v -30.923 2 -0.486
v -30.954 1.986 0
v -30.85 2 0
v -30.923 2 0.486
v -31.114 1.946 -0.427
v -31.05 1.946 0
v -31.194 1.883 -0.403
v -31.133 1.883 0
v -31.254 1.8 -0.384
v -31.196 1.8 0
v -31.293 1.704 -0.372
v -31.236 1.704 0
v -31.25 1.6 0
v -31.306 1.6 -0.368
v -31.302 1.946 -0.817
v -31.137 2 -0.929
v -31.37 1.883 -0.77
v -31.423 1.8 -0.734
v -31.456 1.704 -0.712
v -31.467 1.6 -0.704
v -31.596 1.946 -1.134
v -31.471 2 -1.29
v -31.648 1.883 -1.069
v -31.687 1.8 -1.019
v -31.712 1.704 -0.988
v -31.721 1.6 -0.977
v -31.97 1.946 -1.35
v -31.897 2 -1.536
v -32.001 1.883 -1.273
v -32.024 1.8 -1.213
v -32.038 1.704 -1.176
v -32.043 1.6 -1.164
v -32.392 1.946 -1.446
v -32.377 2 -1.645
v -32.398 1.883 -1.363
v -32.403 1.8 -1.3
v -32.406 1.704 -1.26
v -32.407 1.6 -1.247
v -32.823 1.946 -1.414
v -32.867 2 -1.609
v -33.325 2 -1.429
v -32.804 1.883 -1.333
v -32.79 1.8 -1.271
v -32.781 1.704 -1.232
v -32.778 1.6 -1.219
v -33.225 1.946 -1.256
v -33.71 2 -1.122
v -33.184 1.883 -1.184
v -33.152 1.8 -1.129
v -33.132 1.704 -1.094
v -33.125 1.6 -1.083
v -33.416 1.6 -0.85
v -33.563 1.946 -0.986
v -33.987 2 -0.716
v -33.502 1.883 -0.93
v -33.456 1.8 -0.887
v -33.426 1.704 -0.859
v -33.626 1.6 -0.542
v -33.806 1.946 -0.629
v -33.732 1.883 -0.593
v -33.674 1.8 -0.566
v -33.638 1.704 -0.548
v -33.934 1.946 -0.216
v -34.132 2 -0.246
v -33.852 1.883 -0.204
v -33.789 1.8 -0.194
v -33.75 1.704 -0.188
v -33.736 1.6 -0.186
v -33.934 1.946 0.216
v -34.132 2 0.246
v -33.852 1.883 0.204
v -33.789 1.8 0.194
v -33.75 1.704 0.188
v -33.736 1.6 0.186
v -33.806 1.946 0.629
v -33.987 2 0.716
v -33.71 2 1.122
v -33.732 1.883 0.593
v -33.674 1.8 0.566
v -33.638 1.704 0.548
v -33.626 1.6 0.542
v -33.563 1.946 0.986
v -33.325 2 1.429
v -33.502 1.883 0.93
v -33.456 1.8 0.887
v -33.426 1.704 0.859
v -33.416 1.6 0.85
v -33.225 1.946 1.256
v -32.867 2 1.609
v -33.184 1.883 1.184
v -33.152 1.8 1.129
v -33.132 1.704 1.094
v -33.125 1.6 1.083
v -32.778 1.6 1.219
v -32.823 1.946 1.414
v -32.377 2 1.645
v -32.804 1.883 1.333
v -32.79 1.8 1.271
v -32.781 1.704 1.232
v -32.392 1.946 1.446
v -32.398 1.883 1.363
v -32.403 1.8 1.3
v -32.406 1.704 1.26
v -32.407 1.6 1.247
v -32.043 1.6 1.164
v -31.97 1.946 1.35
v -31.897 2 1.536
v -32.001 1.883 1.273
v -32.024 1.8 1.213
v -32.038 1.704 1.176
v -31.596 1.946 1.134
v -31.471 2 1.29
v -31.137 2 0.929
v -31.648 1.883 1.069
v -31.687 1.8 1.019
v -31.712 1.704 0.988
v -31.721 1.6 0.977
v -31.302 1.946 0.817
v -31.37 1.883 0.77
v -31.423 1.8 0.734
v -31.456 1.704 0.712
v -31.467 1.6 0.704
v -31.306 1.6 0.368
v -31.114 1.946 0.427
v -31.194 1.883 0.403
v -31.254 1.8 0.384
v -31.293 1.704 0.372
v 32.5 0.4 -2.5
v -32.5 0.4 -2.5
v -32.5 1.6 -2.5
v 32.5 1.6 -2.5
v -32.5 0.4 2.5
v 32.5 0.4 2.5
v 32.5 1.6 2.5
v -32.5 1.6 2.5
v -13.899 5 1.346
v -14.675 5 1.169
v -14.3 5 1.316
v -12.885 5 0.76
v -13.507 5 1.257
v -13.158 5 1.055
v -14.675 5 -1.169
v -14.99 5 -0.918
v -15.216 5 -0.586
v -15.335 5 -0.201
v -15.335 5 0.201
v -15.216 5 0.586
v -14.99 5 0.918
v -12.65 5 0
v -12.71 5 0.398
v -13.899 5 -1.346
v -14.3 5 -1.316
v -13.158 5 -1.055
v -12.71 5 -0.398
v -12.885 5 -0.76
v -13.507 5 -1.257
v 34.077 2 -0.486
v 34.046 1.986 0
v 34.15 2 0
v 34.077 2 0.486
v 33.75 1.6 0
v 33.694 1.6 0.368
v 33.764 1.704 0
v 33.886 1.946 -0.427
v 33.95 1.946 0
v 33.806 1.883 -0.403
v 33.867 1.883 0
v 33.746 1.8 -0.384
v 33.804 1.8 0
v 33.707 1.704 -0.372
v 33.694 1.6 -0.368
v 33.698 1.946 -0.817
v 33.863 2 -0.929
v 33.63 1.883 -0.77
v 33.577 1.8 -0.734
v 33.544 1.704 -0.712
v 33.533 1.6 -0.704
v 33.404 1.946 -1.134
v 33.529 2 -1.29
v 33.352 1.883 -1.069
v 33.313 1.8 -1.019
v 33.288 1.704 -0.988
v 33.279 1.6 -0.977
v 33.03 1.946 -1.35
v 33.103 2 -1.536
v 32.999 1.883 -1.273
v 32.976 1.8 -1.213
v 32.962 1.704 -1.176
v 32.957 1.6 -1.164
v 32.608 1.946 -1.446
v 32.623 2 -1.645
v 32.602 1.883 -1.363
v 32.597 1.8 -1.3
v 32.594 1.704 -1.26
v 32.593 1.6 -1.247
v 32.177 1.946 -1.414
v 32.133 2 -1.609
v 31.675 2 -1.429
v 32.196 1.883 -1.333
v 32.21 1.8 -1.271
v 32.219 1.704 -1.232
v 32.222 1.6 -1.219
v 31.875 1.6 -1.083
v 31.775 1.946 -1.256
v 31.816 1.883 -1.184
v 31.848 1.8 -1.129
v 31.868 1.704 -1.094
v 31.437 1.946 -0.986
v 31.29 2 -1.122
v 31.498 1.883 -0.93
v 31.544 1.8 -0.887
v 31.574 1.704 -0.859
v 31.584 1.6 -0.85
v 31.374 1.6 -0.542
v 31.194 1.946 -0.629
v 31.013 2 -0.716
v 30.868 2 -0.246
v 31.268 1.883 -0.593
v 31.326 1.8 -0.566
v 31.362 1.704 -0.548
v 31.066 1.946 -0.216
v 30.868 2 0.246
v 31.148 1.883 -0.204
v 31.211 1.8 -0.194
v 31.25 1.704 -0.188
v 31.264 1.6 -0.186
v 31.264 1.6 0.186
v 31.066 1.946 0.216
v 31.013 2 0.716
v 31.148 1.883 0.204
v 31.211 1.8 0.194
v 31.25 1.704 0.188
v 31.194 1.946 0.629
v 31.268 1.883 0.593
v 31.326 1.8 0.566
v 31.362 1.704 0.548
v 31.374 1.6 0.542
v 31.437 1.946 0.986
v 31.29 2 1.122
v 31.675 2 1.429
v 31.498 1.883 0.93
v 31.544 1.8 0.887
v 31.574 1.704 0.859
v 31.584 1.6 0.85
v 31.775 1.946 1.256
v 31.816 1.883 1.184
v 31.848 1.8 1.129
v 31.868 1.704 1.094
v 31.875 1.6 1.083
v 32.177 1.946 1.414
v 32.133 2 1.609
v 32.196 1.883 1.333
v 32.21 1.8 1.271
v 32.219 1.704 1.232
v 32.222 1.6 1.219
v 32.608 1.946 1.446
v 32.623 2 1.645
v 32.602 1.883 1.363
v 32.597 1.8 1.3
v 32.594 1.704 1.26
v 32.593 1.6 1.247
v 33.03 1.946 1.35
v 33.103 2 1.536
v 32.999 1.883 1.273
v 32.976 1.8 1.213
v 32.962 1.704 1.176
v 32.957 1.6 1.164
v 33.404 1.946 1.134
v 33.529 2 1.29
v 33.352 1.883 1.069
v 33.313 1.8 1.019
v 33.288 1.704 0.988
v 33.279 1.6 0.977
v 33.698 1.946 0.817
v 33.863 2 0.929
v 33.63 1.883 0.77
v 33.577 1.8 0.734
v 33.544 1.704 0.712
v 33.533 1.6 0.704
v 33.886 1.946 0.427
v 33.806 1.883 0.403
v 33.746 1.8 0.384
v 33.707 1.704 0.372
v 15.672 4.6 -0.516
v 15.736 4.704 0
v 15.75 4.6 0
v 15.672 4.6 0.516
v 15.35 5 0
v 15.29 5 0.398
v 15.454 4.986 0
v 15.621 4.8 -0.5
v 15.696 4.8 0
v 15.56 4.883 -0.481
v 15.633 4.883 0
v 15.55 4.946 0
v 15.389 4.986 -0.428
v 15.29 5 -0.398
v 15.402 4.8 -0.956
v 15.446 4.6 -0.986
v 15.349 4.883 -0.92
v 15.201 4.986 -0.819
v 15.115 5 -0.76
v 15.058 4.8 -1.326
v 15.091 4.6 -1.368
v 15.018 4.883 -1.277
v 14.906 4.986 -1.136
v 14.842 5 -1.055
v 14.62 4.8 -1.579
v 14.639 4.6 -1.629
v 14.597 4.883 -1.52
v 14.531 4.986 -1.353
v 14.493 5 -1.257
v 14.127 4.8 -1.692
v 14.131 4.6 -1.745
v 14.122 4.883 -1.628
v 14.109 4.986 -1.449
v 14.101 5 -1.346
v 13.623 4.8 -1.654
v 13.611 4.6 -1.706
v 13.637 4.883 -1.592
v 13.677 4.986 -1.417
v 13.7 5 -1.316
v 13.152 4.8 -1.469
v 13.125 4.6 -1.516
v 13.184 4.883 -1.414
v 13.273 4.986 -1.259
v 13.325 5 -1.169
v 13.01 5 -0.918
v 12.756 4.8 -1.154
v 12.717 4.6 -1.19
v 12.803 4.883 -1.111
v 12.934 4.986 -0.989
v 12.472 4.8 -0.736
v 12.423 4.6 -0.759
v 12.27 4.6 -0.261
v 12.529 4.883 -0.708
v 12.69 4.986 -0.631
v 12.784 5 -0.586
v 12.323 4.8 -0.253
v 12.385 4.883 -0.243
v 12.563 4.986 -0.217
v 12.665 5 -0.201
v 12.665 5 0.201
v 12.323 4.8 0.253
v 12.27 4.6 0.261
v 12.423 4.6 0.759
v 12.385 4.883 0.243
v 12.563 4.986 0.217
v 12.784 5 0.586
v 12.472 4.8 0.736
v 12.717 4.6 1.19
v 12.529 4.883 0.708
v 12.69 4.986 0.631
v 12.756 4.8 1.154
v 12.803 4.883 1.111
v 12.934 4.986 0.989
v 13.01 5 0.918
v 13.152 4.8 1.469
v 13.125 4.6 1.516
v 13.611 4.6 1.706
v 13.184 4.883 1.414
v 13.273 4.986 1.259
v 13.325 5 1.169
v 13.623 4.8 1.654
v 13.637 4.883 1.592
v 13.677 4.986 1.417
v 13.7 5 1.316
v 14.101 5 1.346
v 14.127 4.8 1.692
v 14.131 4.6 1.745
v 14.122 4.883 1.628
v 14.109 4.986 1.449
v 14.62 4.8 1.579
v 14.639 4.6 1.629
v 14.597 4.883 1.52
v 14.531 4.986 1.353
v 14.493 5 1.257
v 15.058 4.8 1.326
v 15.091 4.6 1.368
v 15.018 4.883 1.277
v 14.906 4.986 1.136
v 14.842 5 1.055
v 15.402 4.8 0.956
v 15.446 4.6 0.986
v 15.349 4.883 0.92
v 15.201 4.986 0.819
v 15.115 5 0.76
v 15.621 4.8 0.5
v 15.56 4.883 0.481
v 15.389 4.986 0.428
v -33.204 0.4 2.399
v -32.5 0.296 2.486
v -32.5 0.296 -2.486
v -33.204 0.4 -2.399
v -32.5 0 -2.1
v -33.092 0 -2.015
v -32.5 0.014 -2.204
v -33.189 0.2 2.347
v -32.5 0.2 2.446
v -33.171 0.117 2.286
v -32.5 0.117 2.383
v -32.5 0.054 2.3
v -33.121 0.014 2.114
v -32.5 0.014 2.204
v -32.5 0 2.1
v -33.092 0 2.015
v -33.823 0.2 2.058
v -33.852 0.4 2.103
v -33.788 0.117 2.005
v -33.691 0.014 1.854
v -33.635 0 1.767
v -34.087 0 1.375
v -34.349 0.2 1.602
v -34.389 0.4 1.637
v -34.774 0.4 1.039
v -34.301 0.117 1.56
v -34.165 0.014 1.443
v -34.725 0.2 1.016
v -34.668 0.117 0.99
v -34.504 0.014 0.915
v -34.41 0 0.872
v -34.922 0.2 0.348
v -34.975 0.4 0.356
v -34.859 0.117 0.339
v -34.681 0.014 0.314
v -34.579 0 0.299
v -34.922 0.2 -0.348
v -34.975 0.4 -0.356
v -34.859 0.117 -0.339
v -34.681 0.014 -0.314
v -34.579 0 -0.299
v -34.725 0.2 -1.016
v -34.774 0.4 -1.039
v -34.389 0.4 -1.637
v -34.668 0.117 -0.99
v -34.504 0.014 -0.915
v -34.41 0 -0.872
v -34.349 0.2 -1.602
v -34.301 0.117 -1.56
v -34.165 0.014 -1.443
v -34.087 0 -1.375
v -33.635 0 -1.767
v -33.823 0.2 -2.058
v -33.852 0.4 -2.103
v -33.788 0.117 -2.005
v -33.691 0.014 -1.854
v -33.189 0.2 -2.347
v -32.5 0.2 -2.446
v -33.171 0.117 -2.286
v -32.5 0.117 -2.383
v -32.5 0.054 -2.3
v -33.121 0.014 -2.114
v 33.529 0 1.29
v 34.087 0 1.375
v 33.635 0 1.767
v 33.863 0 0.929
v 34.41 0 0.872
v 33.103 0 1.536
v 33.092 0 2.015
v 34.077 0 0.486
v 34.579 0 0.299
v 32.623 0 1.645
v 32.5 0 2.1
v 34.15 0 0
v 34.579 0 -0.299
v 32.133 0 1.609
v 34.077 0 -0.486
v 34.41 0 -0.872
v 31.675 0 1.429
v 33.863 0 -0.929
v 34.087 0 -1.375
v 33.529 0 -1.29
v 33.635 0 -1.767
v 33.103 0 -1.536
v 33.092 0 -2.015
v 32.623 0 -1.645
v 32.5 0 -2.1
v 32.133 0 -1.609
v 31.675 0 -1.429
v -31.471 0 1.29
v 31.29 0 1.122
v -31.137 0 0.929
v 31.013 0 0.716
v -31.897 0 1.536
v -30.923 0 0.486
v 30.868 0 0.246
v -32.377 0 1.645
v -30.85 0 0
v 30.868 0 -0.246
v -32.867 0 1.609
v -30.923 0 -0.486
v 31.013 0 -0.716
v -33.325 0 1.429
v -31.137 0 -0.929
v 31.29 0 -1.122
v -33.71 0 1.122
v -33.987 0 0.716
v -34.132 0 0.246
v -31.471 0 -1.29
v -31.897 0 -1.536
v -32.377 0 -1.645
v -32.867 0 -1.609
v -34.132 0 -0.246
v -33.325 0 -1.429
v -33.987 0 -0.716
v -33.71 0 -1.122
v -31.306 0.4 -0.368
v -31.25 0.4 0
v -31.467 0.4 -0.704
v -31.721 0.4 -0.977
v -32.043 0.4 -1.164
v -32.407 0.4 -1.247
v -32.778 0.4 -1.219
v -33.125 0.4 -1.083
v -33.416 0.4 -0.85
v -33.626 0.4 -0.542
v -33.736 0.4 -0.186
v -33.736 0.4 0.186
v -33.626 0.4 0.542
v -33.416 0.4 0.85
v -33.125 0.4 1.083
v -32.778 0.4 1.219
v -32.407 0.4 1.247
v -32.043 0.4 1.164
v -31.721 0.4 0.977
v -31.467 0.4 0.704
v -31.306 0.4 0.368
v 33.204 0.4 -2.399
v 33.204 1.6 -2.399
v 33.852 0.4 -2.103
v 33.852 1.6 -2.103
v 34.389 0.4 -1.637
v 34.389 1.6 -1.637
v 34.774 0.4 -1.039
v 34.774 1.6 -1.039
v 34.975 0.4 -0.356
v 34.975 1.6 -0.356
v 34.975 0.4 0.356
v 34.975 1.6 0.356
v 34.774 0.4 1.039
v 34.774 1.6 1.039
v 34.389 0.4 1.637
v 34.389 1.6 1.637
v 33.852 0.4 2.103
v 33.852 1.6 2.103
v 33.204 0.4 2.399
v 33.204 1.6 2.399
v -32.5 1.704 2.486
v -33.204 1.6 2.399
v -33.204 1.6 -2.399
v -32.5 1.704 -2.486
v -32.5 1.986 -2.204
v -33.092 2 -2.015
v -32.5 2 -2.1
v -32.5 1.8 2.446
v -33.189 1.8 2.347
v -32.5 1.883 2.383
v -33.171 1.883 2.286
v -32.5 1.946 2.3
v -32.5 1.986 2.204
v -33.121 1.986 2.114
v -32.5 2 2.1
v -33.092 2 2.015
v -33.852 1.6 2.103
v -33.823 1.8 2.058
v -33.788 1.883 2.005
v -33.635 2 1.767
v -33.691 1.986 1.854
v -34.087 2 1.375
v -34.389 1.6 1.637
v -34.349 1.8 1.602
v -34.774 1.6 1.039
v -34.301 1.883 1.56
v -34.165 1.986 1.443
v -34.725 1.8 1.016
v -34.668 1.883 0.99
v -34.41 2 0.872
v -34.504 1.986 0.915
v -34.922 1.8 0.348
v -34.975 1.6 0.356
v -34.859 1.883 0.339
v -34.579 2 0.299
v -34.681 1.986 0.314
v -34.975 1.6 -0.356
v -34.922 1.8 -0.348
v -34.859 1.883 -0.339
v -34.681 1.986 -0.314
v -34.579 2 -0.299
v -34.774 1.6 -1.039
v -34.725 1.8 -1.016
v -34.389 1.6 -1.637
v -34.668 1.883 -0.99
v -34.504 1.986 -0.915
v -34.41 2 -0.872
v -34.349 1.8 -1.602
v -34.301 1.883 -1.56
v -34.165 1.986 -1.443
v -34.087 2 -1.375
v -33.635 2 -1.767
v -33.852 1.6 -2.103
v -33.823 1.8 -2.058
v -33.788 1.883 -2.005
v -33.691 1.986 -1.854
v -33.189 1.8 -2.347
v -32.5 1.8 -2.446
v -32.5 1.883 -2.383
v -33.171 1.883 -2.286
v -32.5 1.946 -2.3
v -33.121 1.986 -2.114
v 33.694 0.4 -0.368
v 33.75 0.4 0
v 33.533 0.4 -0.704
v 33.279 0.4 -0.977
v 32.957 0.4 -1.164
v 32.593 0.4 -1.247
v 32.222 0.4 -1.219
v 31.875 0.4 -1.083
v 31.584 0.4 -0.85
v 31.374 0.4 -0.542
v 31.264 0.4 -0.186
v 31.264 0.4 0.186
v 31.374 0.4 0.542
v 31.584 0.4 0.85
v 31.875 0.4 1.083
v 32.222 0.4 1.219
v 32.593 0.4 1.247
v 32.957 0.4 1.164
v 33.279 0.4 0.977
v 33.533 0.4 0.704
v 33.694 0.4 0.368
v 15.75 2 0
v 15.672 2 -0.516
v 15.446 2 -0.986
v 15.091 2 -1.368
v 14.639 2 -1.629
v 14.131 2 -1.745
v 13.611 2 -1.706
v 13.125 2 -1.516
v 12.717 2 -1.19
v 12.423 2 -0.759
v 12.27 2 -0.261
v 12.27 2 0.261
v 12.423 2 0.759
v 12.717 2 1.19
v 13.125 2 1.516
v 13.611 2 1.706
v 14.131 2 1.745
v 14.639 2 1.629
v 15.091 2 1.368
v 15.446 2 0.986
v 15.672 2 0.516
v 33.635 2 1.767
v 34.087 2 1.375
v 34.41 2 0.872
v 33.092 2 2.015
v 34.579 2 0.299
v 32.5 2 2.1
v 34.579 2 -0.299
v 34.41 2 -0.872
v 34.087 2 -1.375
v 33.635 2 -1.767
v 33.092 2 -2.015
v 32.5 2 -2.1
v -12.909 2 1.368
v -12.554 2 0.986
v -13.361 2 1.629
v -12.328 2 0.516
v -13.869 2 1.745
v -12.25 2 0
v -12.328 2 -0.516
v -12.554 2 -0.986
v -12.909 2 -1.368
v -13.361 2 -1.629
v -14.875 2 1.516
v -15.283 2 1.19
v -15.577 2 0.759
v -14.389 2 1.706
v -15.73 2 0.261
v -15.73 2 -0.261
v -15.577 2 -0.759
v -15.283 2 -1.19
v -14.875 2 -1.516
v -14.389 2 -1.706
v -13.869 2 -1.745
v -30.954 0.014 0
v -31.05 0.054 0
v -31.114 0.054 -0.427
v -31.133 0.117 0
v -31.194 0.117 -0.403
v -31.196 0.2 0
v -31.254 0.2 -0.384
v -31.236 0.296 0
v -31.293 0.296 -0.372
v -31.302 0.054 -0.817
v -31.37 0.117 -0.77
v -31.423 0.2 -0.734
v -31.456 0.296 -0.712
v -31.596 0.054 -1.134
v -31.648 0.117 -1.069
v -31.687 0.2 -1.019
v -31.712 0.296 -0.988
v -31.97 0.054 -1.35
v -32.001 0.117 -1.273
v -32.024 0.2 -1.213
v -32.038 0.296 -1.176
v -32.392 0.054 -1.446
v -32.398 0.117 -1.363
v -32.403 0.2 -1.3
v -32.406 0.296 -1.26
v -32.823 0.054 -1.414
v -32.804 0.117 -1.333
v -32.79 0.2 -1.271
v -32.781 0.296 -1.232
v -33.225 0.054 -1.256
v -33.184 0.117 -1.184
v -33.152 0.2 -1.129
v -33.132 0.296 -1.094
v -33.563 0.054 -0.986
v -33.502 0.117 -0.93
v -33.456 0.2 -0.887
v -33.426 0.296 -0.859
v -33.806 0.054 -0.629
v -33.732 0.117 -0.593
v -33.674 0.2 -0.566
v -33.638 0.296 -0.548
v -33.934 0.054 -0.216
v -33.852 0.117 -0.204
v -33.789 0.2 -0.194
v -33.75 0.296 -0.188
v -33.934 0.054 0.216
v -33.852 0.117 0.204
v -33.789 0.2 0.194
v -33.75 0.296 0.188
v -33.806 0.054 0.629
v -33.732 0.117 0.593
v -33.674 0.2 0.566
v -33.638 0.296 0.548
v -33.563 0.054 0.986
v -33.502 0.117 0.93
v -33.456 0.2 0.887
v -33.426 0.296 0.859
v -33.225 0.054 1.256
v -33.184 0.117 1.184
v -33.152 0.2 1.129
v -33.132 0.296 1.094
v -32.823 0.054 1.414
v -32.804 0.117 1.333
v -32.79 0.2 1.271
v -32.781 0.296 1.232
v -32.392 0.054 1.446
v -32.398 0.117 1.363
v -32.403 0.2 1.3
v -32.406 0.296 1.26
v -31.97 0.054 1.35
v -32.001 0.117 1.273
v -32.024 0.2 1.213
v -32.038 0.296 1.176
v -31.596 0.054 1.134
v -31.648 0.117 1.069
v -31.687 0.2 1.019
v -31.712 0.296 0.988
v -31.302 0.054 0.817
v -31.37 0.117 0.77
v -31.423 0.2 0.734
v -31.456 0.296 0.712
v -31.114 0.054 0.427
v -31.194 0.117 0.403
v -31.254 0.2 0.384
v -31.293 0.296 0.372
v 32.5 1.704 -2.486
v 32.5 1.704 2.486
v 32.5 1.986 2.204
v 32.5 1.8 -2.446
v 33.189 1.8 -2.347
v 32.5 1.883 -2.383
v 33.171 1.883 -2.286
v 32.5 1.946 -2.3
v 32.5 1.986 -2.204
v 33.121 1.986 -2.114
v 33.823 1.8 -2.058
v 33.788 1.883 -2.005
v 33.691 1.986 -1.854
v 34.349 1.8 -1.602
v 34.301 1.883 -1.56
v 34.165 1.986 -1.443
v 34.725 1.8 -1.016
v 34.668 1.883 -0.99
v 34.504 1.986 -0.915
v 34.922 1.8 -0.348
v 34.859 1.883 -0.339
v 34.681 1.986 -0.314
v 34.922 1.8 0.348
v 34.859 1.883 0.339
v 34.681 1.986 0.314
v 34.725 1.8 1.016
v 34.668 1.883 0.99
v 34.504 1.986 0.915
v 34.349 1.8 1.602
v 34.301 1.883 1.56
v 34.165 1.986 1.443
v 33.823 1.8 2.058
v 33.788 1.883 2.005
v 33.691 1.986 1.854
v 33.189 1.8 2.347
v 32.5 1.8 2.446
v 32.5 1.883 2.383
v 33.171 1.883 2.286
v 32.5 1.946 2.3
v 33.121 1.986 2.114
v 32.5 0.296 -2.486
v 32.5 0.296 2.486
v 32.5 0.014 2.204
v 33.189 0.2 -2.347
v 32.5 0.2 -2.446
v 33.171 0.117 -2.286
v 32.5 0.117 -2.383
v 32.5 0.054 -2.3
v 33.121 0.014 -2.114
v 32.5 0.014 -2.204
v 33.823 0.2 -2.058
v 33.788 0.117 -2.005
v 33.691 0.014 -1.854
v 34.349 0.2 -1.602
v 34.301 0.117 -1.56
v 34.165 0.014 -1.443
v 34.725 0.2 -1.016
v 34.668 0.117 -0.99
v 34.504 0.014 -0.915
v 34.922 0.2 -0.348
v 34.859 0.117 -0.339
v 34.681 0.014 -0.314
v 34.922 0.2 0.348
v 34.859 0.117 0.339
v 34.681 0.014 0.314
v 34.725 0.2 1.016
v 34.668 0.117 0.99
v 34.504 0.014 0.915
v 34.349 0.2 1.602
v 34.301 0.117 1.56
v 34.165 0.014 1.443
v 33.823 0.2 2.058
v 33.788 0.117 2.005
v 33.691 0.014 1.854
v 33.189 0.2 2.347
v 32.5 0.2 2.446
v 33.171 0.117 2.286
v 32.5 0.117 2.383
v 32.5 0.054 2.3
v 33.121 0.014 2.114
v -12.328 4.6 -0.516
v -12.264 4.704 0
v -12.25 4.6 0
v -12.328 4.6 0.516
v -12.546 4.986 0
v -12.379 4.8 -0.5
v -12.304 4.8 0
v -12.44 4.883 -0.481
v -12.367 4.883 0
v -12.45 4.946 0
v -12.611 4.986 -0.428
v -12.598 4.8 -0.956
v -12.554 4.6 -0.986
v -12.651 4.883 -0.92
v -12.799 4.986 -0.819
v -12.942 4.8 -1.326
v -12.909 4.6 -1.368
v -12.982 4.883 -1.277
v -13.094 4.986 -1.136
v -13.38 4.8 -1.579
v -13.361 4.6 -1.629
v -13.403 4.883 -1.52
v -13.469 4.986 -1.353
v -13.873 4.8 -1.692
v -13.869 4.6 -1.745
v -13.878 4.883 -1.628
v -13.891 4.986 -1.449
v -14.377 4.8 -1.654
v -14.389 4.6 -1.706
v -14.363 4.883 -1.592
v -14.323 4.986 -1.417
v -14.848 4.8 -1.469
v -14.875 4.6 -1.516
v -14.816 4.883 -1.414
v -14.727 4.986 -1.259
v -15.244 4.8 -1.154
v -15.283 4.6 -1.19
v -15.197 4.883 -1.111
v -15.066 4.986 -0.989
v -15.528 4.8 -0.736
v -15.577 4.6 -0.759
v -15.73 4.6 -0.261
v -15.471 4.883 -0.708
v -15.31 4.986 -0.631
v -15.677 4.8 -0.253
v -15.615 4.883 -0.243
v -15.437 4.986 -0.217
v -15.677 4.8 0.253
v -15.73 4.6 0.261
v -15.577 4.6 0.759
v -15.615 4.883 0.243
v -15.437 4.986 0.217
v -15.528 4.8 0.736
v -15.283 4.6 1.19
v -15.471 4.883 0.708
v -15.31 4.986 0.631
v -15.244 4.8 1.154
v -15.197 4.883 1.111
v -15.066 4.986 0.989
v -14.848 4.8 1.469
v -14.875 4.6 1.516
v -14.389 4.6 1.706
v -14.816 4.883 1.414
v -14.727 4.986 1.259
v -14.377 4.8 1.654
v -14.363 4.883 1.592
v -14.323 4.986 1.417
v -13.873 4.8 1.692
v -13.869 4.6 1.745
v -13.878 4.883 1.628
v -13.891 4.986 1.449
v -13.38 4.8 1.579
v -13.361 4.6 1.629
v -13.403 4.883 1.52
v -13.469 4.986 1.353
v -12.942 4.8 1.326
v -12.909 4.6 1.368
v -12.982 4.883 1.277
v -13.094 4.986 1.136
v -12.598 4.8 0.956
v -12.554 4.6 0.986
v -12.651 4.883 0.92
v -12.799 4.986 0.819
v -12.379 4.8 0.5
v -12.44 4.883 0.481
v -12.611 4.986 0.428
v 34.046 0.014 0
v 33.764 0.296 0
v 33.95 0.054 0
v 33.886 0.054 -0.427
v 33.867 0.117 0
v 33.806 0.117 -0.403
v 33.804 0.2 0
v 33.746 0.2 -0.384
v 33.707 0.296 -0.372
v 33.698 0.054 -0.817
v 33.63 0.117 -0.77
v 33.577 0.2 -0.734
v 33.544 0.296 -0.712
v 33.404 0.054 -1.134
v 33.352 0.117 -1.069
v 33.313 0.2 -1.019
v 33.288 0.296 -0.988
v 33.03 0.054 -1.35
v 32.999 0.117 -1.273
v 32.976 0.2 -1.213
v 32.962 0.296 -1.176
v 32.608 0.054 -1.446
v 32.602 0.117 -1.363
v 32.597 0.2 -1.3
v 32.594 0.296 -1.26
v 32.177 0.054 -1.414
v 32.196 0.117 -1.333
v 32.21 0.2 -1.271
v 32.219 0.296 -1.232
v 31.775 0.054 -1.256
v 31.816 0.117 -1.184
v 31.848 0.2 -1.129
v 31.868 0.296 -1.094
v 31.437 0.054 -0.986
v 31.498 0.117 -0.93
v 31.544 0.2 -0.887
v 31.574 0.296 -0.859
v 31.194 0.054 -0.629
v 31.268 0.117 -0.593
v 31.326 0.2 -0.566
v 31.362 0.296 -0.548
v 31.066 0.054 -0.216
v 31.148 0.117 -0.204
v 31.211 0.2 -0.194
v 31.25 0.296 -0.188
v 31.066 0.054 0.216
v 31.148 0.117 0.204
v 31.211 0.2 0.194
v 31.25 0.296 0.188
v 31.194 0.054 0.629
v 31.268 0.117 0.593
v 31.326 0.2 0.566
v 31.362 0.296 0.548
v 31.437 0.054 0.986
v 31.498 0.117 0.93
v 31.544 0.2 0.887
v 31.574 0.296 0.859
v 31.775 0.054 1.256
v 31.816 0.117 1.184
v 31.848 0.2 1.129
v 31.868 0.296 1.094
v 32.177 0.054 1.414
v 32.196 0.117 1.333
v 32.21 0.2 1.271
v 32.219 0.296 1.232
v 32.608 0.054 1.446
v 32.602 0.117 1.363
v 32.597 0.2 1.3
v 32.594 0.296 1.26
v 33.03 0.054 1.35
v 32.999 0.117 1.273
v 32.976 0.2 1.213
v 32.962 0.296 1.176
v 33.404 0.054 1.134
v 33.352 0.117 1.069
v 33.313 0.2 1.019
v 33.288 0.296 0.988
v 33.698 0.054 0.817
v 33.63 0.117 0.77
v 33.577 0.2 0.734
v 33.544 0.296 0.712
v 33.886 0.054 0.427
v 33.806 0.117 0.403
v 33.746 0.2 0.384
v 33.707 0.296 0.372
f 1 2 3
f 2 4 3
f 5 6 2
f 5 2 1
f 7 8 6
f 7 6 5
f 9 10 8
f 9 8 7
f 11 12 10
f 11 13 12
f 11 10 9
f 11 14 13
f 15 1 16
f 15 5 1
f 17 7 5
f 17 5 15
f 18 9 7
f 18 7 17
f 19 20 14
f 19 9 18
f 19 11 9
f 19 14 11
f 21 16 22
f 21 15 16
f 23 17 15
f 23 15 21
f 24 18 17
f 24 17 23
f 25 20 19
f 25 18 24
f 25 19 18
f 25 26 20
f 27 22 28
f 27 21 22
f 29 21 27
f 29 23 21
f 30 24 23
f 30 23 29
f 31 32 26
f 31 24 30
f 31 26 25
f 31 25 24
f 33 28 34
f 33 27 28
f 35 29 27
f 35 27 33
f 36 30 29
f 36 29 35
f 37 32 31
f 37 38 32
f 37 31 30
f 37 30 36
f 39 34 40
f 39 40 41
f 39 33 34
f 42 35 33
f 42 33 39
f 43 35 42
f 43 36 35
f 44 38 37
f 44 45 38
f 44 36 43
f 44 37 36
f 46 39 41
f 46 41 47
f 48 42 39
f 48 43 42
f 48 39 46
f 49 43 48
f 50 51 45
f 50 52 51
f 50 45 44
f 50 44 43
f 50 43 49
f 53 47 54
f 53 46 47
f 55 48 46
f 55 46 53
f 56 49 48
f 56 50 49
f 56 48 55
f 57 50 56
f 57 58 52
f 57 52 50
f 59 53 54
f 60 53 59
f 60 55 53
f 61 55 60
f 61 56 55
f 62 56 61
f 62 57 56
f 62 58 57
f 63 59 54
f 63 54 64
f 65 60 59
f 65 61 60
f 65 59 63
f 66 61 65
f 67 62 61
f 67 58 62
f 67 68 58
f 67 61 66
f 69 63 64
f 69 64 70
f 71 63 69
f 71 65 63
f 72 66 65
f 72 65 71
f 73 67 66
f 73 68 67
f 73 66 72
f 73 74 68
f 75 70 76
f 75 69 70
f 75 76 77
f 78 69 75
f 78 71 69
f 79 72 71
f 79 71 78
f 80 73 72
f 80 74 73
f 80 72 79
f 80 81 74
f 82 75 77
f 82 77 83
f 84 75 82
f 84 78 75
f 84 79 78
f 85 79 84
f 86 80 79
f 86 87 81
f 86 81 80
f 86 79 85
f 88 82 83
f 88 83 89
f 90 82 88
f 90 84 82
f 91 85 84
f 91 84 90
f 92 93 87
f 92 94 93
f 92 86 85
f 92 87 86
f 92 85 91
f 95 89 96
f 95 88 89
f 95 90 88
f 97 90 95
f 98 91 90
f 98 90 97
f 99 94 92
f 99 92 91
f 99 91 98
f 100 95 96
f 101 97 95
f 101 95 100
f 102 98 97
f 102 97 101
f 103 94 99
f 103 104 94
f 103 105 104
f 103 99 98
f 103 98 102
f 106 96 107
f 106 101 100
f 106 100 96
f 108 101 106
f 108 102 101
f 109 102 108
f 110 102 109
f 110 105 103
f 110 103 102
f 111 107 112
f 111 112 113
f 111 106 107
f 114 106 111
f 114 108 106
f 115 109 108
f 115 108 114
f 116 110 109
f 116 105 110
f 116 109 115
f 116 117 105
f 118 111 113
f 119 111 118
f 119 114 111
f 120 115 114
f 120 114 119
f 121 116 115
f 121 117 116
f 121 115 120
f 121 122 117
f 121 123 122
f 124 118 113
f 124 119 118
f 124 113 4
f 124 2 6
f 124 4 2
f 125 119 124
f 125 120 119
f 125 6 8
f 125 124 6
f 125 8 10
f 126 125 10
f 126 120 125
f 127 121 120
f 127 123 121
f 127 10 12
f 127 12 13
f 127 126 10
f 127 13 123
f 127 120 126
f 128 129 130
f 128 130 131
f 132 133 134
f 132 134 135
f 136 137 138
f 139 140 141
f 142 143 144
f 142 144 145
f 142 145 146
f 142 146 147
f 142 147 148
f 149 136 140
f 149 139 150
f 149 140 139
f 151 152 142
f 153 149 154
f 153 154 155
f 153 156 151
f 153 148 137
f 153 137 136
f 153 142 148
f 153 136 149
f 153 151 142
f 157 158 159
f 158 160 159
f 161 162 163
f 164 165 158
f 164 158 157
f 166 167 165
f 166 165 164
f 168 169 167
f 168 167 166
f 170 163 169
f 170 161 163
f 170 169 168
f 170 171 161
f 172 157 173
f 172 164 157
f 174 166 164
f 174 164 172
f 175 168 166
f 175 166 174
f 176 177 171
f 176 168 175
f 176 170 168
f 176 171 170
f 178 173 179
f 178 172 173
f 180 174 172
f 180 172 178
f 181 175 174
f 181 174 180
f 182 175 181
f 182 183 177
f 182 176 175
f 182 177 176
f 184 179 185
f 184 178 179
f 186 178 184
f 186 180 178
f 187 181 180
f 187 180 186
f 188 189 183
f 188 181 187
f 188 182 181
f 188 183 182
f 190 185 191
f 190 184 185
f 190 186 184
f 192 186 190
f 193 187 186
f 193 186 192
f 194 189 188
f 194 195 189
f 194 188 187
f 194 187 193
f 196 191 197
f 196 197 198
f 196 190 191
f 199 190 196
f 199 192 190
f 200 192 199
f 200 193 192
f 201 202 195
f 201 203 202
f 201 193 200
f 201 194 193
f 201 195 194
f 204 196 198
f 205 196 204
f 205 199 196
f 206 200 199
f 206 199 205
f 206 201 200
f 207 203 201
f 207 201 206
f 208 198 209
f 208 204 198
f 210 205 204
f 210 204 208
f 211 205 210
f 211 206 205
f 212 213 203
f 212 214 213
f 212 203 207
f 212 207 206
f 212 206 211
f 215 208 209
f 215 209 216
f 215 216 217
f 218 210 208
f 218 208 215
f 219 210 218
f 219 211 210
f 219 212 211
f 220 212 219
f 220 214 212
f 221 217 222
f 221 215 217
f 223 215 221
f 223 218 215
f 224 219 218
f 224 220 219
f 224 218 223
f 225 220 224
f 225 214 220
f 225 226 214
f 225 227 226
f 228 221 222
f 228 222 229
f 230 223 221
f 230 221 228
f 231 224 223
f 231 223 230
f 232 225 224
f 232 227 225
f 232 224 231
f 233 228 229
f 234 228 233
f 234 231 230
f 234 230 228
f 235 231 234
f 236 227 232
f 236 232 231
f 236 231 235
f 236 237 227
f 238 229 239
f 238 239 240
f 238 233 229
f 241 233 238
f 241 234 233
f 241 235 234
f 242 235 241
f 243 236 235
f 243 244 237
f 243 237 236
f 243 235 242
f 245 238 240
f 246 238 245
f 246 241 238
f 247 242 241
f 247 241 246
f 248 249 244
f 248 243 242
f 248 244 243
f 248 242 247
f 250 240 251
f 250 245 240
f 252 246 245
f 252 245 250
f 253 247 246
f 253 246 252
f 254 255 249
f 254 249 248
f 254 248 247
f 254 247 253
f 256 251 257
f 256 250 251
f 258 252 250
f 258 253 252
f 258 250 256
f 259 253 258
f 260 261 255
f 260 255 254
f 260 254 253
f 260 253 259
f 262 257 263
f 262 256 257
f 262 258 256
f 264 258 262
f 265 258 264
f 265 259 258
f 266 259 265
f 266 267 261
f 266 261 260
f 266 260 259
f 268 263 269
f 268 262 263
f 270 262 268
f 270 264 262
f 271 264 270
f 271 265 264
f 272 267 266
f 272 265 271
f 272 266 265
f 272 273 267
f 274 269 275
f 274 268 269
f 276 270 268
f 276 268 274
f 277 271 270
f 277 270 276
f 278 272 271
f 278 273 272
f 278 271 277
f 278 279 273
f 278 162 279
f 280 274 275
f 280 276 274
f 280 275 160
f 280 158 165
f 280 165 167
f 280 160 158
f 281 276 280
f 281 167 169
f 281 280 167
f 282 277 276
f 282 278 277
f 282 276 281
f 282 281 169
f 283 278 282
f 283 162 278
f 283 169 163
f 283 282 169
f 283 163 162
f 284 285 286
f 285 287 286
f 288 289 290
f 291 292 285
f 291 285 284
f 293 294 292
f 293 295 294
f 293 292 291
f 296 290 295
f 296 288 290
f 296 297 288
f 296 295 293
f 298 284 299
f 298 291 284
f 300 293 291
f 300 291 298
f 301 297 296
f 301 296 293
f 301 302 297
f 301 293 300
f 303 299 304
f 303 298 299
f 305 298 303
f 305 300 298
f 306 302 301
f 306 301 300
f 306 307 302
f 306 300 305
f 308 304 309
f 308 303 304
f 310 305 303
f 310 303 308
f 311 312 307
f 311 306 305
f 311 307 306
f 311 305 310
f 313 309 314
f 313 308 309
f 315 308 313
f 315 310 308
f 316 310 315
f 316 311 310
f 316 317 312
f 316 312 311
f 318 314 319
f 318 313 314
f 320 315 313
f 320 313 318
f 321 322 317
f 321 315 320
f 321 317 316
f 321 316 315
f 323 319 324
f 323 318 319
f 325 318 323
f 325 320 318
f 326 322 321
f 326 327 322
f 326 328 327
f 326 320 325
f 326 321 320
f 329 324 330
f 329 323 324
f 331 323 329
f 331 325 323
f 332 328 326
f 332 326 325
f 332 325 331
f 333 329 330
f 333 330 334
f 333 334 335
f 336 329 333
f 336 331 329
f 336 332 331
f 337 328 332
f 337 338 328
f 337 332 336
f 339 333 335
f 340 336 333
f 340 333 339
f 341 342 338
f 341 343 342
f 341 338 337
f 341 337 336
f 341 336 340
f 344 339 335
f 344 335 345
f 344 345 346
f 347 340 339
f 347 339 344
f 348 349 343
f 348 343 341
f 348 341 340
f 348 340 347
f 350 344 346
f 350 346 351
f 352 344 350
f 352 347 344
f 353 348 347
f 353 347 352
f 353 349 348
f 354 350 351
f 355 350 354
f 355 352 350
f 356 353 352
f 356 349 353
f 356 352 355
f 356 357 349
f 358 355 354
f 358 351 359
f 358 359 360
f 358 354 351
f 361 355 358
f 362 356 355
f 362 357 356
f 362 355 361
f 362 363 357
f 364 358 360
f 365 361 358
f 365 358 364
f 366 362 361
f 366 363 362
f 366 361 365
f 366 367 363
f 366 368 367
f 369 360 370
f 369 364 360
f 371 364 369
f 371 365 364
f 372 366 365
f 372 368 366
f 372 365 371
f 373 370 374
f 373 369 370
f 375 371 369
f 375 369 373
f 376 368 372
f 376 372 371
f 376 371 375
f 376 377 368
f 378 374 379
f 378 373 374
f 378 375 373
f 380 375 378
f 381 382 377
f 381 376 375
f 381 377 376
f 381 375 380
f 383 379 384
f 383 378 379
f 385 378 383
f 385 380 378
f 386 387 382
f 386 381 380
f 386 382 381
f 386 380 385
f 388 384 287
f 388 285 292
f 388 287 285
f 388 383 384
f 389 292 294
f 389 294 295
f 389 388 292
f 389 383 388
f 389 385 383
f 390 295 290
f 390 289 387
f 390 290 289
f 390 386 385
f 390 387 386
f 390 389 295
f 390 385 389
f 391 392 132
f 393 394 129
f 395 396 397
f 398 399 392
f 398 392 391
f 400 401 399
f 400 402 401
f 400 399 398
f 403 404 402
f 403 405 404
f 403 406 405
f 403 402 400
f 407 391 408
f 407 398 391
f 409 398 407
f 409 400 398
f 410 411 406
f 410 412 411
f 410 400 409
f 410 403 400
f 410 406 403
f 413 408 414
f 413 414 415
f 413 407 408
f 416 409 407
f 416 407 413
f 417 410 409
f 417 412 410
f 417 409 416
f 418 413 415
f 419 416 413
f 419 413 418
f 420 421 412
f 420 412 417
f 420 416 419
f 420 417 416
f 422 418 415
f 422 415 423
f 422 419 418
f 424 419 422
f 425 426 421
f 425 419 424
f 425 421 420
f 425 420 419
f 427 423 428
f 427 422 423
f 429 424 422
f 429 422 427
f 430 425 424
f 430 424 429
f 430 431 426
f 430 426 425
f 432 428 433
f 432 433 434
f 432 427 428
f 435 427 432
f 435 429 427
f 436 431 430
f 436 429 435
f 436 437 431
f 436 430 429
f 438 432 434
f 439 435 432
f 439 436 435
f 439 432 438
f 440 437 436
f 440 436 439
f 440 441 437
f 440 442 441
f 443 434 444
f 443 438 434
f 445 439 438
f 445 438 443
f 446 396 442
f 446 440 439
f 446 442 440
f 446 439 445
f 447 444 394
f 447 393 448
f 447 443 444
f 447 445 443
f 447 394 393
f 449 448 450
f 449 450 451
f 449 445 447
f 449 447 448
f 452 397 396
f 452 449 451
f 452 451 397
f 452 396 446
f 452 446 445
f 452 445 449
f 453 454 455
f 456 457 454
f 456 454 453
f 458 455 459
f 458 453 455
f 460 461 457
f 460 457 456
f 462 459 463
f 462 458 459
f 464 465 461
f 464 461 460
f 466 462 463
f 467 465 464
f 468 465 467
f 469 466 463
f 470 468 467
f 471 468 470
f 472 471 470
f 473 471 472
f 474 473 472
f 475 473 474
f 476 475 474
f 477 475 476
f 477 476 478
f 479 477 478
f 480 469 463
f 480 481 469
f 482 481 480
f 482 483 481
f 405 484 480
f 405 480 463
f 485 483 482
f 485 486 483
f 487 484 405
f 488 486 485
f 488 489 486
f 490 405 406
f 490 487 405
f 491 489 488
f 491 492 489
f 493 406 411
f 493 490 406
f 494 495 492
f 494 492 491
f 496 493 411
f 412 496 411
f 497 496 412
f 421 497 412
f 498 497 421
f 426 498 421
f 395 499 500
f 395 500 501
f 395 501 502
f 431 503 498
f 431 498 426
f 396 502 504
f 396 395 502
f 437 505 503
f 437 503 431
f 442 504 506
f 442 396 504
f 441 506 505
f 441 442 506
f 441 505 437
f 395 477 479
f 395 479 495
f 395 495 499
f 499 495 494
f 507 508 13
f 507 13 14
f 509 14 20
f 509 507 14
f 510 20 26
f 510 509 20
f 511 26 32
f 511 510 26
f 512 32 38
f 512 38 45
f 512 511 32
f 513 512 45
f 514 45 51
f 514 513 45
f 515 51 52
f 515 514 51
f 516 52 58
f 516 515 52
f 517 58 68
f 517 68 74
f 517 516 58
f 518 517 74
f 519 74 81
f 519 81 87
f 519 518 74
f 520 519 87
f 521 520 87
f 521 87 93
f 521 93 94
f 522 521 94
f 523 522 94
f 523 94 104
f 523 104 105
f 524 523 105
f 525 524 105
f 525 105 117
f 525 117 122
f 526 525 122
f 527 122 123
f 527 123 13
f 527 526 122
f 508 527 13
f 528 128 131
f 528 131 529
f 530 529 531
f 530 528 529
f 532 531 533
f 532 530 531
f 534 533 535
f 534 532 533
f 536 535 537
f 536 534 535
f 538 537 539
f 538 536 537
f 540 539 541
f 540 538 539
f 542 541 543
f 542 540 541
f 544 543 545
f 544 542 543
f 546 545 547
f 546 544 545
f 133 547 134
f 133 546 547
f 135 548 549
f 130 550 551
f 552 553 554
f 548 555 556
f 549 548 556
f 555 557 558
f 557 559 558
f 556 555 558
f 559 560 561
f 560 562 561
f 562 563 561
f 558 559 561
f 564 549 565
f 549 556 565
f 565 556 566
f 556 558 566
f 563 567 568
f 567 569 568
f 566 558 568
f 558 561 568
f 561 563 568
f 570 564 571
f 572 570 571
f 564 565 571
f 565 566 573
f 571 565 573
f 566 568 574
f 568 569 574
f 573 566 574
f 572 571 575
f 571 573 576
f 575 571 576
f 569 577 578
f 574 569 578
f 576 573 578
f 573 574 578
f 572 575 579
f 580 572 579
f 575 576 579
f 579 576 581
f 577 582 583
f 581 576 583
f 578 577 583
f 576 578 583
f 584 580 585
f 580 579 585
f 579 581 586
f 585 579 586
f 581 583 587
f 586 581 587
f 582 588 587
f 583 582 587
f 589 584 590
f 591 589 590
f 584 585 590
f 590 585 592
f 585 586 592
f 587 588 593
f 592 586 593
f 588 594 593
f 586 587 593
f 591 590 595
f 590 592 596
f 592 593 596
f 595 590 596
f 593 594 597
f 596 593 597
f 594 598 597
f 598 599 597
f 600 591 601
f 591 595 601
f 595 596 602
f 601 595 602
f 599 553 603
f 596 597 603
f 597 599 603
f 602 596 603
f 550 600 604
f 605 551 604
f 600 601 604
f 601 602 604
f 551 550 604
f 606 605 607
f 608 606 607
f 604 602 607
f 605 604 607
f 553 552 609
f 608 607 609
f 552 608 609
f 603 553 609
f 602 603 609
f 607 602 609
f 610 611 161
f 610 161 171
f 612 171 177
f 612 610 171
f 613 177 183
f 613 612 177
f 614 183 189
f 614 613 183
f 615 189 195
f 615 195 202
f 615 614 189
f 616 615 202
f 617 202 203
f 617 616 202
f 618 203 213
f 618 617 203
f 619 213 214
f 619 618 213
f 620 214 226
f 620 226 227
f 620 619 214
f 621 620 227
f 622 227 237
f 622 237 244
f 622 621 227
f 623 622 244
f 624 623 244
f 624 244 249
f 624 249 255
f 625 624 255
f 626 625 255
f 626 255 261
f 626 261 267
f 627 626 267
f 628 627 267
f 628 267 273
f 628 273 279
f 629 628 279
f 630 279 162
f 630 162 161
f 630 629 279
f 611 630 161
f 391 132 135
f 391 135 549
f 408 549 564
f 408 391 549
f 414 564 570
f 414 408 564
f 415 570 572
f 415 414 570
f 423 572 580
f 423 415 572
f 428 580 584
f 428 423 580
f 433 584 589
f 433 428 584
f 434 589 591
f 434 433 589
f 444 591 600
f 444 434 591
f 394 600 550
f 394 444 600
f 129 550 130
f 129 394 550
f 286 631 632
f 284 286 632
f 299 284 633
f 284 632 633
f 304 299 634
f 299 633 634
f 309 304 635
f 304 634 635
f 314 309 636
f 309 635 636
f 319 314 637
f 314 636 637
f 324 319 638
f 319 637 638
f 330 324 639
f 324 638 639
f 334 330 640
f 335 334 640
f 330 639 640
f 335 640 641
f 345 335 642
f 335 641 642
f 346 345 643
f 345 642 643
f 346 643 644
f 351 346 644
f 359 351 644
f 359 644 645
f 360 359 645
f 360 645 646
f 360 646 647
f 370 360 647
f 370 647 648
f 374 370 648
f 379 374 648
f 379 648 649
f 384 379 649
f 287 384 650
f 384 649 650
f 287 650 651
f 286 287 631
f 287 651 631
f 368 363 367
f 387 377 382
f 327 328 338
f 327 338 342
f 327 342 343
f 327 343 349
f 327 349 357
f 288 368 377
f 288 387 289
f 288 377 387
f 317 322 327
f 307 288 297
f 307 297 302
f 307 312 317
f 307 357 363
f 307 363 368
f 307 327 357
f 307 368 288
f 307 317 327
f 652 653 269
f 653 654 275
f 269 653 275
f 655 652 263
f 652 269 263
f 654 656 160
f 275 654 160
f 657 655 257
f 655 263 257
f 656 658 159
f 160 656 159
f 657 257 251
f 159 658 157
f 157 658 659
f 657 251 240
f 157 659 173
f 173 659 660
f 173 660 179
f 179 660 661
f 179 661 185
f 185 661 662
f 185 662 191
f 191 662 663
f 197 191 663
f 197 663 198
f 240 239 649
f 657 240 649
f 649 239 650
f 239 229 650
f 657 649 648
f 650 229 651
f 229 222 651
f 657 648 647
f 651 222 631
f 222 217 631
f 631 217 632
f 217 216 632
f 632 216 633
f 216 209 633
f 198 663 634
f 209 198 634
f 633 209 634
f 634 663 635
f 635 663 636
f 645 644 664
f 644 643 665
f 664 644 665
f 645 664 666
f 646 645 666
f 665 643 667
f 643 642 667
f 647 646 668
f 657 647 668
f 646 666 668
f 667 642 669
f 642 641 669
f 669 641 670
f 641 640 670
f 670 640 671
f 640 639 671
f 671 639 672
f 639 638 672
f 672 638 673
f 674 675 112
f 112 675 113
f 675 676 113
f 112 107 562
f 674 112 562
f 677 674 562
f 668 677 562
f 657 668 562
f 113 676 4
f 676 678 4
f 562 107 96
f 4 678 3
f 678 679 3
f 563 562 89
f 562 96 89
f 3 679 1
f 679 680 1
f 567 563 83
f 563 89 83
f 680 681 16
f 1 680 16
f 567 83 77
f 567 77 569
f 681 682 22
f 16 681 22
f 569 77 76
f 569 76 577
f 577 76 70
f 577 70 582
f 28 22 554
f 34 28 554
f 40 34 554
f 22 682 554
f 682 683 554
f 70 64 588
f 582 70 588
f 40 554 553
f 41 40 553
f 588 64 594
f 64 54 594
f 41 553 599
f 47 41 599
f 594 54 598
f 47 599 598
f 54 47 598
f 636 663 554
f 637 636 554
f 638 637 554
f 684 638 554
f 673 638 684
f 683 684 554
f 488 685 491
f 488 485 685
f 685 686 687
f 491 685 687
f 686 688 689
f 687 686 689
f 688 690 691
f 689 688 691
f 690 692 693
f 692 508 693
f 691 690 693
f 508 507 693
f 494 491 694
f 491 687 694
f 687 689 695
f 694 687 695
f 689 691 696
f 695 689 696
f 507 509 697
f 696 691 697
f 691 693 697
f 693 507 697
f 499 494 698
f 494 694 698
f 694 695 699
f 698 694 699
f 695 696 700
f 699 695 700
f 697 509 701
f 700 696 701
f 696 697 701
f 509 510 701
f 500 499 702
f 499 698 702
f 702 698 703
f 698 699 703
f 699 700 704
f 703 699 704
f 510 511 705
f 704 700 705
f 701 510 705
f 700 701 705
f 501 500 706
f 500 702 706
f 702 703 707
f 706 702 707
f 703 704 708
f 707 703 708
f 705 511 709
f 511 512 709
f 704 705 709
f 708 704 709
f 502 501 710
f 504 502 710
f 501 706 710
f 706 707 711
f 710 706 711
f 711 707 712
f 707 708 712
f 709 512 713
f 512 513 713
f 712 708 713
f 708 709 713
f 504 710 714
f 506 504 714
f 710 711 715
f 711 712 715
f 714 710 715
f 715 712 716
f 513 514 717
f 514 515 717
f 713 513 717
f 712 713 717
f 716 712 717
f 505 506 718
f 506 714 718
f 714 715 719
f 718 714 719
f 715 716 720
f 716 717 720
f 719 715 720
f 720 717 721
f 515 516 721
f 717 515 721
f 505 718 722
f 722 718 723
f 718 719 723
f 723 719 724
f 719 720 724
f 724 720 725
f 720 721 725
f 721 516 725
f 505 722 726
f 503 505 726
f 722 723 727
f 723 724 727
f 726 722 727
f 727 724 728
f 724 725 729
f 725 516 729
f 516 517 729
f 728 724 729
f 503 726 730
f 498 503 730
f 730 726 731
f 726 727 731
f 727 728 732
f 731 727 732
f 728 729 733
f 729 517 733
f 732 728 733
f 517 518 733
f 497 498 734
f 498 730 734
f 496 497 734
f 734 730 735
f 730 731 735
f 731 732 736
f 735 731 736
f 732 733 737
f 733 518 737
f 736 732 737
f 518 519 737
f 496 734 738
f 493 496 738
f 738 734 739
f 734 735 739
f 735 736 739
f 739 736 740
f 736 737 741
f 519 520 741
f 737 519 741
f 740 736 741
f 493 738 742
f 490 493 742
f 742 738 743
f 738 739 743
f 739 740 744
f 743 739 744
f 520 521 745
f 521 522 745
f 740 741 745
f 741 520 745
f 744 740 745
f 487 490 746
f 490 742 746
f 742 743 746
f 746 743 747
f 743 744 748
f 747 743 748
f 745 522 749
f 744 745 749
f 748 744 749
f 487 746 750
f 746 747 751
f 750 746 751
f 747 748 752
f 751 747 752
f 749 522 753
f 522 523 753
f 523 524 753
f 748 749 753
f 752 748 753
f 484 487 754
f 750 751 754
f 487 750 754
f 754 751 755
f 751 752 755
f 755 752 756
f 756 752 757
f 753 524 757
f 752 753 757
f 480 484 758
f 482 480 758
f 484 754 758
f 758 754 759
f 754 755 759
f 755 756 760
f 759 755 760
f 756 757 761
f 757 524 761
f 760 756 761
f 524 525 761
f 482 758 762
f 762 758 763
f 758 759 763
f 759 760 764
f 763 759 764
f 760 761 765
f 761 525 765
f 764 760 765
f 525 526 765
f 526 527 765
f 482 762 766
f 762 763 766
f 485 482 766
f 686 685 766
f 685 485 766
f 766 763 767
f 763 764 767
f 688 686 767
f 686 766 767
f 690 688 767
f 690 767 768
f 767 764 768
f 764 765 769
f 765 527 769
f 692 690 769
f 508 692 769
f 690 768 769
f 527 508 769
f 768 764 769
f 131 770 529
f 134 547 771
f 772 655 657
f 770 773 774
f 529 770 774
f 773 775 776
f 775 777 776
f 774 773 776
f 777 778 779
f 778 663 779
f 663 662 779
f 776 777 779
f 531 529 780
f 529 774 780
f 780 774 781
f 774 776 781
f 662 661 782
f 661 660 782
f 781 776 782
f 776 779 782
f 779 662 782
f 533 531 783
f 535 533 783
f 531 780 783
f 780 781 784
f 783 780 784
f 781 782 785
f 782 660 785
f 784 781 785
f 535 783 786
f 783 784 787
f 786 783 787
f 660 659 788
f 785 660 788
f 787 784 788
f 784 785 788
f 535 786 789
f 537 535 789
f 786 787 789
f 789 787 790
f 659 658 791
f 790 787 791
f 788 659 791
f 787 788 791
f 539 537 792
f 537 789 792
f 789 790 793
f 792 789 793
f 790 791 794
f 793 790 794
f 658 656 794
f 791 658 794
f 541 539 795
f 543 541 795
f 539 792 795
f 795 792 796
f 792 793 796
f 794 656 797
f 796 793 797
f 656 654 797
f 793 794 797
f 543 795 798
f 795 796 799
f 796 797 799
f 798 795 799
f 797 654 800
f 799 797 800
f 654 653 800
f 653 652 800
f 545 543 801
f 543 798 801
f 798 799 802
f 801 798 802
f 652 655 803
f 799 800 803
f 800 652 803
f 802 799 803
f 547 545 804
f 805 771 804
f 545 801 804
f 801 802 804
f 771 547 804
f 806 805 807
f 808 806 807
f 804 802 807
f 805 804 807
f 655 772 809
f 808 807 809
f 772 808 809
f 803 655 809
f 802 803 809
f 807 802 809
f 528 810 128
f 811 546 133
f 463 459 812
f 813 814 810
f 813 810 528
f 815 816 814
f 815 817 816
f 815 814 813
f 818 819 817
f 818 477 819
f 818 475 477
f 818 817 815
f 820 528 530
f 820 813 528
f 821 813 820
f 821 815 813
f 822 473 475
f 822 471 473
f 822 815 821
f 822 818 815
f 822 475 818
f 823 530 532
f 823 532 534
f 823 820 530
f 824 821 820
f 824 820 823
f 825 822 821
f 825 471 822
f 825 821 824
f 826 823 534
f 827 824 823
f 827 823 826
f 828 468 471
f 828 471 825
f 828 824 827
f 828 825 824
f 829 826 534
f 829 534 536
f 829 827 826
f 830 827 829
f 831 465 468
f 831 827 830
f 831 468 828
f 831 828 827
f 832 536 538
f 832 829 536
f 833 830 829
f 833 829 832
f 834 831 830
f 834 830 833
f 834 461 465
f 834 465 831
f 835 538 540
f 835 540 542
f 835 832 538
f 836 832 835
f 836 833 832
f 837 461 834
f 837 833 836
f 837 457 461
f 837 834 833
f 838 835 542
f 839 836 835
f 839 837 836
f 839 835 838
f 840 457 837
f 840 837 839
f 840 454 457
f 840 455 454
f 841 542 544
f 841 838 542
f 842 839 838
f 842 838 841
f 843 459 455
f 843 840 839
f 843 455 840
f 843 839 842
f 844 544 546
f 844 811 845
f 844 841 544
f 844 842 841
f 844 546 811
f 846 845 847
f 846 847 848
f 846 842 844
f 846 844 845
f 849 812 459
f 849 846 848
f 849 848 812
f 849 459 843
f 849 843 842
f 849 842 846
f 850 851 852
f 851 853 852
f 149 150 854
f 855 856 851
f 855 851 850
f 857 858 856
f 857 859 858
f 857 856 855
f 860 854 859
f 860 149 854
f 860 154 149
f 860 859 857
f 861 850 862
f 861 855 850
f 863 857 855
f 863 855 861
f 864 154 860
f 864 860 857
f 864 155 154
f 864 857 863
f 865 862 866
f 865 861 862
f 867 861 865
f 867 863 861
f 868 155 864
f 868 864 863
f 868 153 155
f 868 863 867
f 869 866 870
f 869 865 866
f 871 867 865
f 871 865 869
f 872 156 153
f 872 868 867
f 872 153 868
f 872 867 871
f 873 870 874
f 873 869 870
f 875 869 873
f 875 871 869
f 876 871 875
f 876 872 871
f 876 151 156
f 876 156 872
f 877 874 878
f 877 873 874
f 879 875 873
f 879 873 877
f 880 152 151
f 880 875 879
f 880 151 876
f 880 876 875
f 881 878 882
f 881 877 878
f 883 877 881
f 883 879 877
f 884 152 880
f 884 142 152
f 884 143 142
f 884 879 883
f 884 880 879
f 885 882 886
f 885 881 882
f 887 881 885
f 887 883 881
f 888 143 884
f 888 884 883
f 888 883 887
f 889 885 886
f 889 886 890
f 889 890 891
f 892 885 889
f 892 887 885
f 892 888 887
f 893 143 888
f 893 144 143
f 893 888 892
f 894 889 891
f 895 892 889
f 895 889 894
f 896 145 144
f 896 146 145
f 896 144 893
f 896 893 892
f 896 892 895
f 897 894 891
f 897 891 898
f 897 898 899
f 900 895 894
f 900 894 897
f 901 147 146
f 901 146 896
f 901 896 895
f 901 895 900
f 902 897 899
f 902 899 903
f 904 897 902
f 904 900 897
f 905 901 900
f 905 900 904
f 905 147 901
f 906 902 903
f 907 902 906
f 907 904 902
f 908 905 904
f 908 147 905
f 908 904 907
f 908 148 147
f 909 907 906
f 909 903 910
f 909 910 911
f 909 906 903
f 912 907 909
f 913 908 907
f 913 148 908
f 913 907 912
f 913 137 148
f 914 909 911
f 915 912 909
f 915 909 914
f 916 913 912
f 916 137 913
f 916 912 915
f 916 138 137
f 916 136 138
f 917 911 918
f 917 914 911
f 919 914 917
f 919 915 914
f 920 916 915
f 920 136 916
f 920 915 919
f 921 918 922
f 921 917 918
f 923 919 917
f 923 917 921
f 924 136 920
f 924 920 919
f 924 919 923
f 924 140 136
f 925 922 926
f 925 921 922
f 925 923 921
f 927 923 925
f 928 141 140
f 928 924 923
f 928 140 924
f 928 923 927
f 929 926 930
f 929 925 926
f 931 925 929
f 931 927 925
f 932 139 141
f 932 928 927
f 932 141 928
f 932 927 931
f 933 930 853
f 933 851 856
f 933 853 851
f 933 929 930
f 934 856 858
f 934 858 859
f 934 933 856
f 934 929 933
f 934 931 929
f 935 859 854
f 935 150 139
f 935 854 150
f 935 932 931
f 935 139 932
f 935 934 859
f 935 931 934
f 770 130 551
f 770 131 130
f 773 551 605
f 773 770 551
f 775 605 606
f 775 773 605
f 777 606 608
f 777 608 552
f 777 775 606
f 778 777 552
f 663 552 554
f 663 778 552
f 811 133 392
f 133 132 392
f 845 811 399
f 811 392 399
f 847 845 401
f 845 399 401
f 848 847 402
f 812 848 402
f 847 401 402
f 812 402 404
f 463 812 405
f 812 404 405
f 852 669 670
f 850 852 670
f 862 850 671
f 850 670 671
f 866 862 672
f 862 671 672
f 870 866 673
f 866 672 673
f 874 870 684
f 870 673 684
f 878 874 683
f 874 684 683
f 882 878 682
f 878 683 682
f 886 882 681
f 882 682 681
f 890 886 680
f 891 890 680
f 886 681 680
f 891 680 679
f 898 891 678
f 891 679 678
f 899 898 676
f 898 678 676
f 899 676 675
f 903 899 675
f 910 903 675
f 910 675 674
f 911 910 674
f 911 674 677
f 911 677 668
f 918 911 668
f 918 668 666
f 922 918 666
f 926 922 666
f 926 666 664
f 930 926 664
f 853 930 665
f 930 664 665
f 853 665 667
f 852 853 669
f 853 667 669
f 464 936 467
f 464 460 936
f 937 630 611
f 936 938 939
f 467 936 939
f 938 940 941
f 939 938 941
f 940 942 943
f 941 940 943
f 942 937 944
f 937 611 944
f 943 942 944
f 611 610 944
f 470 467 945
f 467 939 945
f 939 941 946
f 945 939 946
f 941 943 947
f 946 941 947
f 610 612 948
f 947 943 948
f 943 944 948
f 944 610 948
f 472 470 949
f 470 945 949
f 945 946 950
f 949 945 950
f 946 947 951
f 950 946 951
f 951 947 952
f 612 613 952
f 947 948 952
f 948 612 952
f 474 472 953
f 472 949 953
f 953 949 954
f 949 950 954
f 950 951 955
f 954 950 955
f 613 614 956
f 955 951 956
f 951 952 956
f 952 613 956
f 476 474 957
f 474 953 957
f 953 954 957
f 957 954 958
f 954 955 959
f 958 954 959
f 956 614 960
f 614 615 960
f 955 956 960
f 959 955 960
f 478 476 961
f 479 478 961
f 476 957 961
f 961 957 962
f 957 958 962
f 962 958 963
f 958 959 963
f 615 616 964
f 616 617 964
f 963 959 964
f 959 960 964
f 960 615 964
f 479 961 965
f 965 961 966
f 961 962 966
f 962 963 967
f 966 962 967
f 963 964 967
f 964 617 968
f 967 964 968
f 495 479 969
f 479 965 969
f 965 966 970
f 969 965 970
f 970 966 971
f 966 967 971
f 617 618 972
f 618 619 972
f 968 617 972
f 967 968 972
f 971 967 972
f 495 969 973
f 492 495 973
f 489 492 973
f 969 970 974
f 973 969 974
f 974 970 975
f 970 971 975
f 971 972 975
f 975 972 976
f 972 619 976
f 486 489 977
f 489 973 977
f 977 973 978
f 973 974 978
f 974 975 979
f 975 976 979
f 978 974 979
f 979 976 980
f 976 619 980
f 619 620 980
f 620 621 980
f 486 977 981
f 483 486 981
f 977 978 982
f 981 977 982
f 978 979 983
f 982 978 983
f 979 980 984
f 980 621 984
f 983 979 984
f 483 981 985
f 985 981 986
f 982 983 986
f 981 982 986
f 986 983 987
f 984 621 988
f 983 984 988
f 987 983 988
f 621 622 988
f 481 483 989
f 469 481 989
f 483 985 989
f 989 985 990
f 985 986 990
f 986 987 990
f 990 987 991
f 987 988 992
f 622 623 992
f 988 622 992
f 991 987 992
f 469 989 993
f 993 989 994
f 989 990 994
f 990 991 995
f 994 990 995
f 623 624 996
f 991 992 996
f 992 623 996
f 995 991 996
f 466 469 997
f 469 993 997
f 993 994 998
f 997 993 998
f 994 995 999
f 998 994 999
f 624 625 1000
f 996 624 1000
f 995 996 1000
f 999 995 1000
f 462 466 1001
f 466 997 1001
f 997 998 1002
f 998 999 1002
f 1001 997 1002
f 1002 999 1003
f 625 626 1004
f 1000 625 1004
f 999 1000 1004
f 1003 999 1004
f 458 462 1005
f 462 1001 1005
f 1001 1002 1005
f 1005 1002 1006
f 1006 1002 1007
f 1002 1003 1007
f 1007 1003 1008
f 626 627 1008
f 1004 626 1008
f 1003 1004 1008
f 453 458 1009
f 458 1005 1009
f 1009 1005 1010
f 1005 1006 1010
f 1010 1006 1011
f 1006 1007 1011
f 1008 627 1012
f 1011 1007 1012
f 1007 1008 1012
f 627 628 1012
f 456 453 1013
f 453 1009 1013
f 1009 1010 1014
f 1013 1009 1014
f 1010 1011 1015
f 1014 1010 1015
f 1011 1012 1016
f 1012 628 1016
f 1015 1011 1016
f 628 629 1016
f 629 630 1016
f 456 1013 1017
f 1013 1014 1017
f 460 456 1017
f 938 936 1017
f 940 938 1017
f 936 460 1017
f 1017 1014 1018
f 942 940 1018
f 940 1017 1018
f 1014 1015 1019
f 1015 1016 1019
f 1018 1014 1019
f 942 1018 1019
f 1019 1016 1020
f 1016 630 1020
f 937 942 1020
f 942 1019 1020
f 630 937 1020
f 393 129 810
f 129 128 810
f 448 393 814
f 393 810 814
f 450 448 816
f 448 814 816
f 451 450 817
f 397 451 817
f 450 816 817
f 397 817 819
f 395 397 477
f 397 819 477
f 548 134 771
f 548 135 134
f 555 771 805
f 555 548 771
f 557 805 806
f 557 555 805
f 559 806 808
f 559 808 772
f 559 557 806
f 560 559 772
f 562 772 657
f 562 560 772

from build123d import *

# Parameters (mm, degrees)
SKETCH_1_R      = 1.25
EXTRUDE_1_DEPTH = 2
SKETCH_2_R      = 1.75
EXTRUDE_2_DEPTH = 3
FILLET_1_R      = 0.4


with BuildPart() as part:
    # 草图1 → 凸台-拉伸1 (new body)
    with BuildSketch(Plane(origin=(0, 0, 0), x_dir=(1, 0, 0), z_dir=(0, 1, 0))):
        with BuildLine():
            Line((-32.5, 2.5), (32.5, 2.5))
            ThreePointArc((32.5, 2.5), (35, 0), (32.5, -2.5))
            Line((32.5, -2.5), (-32.5, -2.5))
            ThreePointArc((-32.5, -2.5), (-35, 0), (-32.5, 2.5))
        make_face()
        with Locations((-32.5, 0)):
            Circle(SKETCH_1_R, mode=Mode.SUBTRACT)
        with Locations((32.5, 0)):
            Circle(SKETCH_1_R, mode=Mode.SUBTRACT)
    extrude(amount=EXTRUDE_1_DEPTH)

    # 草图2 → 凸台-拉伸2 (add)
    with BuildSketch(Plane(origin=(0, 2, 0), x_dir=(1, 0, 0), z_dir=(0, 1, 0))):
        with Locations((14, 0)):
            Circle(SKETCH_2_R)
        with Locations((-14, 0)):
            Circle(SKETCH_2_R)
    extrude(amount=EXTRUDE_2_DEPTH)

    # 圆角1
    fillet_1_edges = [part.edges().sort_by_distance(p)[0] for p in [
        (-33.75, 0, 0),
        (-33.75, 2, 0),
        (35, 2, 0),
        (31.25, 0, 0),
        (31.25, 2, 0),
        (0, 2, -2.5),
        (12.25, 5, 0),
        (-15.75, 5, 0),
        (-35, 2, 0),
        (0, 0, -2.5),
        (35, 0, 0),
        (0, 0, 2.5),
        (-35, 0, 0),
        (0, 2, 2.5),
    ]]
    fillet(fillet_1_edges, radius=FILLET_1_R)


solid = part.part
